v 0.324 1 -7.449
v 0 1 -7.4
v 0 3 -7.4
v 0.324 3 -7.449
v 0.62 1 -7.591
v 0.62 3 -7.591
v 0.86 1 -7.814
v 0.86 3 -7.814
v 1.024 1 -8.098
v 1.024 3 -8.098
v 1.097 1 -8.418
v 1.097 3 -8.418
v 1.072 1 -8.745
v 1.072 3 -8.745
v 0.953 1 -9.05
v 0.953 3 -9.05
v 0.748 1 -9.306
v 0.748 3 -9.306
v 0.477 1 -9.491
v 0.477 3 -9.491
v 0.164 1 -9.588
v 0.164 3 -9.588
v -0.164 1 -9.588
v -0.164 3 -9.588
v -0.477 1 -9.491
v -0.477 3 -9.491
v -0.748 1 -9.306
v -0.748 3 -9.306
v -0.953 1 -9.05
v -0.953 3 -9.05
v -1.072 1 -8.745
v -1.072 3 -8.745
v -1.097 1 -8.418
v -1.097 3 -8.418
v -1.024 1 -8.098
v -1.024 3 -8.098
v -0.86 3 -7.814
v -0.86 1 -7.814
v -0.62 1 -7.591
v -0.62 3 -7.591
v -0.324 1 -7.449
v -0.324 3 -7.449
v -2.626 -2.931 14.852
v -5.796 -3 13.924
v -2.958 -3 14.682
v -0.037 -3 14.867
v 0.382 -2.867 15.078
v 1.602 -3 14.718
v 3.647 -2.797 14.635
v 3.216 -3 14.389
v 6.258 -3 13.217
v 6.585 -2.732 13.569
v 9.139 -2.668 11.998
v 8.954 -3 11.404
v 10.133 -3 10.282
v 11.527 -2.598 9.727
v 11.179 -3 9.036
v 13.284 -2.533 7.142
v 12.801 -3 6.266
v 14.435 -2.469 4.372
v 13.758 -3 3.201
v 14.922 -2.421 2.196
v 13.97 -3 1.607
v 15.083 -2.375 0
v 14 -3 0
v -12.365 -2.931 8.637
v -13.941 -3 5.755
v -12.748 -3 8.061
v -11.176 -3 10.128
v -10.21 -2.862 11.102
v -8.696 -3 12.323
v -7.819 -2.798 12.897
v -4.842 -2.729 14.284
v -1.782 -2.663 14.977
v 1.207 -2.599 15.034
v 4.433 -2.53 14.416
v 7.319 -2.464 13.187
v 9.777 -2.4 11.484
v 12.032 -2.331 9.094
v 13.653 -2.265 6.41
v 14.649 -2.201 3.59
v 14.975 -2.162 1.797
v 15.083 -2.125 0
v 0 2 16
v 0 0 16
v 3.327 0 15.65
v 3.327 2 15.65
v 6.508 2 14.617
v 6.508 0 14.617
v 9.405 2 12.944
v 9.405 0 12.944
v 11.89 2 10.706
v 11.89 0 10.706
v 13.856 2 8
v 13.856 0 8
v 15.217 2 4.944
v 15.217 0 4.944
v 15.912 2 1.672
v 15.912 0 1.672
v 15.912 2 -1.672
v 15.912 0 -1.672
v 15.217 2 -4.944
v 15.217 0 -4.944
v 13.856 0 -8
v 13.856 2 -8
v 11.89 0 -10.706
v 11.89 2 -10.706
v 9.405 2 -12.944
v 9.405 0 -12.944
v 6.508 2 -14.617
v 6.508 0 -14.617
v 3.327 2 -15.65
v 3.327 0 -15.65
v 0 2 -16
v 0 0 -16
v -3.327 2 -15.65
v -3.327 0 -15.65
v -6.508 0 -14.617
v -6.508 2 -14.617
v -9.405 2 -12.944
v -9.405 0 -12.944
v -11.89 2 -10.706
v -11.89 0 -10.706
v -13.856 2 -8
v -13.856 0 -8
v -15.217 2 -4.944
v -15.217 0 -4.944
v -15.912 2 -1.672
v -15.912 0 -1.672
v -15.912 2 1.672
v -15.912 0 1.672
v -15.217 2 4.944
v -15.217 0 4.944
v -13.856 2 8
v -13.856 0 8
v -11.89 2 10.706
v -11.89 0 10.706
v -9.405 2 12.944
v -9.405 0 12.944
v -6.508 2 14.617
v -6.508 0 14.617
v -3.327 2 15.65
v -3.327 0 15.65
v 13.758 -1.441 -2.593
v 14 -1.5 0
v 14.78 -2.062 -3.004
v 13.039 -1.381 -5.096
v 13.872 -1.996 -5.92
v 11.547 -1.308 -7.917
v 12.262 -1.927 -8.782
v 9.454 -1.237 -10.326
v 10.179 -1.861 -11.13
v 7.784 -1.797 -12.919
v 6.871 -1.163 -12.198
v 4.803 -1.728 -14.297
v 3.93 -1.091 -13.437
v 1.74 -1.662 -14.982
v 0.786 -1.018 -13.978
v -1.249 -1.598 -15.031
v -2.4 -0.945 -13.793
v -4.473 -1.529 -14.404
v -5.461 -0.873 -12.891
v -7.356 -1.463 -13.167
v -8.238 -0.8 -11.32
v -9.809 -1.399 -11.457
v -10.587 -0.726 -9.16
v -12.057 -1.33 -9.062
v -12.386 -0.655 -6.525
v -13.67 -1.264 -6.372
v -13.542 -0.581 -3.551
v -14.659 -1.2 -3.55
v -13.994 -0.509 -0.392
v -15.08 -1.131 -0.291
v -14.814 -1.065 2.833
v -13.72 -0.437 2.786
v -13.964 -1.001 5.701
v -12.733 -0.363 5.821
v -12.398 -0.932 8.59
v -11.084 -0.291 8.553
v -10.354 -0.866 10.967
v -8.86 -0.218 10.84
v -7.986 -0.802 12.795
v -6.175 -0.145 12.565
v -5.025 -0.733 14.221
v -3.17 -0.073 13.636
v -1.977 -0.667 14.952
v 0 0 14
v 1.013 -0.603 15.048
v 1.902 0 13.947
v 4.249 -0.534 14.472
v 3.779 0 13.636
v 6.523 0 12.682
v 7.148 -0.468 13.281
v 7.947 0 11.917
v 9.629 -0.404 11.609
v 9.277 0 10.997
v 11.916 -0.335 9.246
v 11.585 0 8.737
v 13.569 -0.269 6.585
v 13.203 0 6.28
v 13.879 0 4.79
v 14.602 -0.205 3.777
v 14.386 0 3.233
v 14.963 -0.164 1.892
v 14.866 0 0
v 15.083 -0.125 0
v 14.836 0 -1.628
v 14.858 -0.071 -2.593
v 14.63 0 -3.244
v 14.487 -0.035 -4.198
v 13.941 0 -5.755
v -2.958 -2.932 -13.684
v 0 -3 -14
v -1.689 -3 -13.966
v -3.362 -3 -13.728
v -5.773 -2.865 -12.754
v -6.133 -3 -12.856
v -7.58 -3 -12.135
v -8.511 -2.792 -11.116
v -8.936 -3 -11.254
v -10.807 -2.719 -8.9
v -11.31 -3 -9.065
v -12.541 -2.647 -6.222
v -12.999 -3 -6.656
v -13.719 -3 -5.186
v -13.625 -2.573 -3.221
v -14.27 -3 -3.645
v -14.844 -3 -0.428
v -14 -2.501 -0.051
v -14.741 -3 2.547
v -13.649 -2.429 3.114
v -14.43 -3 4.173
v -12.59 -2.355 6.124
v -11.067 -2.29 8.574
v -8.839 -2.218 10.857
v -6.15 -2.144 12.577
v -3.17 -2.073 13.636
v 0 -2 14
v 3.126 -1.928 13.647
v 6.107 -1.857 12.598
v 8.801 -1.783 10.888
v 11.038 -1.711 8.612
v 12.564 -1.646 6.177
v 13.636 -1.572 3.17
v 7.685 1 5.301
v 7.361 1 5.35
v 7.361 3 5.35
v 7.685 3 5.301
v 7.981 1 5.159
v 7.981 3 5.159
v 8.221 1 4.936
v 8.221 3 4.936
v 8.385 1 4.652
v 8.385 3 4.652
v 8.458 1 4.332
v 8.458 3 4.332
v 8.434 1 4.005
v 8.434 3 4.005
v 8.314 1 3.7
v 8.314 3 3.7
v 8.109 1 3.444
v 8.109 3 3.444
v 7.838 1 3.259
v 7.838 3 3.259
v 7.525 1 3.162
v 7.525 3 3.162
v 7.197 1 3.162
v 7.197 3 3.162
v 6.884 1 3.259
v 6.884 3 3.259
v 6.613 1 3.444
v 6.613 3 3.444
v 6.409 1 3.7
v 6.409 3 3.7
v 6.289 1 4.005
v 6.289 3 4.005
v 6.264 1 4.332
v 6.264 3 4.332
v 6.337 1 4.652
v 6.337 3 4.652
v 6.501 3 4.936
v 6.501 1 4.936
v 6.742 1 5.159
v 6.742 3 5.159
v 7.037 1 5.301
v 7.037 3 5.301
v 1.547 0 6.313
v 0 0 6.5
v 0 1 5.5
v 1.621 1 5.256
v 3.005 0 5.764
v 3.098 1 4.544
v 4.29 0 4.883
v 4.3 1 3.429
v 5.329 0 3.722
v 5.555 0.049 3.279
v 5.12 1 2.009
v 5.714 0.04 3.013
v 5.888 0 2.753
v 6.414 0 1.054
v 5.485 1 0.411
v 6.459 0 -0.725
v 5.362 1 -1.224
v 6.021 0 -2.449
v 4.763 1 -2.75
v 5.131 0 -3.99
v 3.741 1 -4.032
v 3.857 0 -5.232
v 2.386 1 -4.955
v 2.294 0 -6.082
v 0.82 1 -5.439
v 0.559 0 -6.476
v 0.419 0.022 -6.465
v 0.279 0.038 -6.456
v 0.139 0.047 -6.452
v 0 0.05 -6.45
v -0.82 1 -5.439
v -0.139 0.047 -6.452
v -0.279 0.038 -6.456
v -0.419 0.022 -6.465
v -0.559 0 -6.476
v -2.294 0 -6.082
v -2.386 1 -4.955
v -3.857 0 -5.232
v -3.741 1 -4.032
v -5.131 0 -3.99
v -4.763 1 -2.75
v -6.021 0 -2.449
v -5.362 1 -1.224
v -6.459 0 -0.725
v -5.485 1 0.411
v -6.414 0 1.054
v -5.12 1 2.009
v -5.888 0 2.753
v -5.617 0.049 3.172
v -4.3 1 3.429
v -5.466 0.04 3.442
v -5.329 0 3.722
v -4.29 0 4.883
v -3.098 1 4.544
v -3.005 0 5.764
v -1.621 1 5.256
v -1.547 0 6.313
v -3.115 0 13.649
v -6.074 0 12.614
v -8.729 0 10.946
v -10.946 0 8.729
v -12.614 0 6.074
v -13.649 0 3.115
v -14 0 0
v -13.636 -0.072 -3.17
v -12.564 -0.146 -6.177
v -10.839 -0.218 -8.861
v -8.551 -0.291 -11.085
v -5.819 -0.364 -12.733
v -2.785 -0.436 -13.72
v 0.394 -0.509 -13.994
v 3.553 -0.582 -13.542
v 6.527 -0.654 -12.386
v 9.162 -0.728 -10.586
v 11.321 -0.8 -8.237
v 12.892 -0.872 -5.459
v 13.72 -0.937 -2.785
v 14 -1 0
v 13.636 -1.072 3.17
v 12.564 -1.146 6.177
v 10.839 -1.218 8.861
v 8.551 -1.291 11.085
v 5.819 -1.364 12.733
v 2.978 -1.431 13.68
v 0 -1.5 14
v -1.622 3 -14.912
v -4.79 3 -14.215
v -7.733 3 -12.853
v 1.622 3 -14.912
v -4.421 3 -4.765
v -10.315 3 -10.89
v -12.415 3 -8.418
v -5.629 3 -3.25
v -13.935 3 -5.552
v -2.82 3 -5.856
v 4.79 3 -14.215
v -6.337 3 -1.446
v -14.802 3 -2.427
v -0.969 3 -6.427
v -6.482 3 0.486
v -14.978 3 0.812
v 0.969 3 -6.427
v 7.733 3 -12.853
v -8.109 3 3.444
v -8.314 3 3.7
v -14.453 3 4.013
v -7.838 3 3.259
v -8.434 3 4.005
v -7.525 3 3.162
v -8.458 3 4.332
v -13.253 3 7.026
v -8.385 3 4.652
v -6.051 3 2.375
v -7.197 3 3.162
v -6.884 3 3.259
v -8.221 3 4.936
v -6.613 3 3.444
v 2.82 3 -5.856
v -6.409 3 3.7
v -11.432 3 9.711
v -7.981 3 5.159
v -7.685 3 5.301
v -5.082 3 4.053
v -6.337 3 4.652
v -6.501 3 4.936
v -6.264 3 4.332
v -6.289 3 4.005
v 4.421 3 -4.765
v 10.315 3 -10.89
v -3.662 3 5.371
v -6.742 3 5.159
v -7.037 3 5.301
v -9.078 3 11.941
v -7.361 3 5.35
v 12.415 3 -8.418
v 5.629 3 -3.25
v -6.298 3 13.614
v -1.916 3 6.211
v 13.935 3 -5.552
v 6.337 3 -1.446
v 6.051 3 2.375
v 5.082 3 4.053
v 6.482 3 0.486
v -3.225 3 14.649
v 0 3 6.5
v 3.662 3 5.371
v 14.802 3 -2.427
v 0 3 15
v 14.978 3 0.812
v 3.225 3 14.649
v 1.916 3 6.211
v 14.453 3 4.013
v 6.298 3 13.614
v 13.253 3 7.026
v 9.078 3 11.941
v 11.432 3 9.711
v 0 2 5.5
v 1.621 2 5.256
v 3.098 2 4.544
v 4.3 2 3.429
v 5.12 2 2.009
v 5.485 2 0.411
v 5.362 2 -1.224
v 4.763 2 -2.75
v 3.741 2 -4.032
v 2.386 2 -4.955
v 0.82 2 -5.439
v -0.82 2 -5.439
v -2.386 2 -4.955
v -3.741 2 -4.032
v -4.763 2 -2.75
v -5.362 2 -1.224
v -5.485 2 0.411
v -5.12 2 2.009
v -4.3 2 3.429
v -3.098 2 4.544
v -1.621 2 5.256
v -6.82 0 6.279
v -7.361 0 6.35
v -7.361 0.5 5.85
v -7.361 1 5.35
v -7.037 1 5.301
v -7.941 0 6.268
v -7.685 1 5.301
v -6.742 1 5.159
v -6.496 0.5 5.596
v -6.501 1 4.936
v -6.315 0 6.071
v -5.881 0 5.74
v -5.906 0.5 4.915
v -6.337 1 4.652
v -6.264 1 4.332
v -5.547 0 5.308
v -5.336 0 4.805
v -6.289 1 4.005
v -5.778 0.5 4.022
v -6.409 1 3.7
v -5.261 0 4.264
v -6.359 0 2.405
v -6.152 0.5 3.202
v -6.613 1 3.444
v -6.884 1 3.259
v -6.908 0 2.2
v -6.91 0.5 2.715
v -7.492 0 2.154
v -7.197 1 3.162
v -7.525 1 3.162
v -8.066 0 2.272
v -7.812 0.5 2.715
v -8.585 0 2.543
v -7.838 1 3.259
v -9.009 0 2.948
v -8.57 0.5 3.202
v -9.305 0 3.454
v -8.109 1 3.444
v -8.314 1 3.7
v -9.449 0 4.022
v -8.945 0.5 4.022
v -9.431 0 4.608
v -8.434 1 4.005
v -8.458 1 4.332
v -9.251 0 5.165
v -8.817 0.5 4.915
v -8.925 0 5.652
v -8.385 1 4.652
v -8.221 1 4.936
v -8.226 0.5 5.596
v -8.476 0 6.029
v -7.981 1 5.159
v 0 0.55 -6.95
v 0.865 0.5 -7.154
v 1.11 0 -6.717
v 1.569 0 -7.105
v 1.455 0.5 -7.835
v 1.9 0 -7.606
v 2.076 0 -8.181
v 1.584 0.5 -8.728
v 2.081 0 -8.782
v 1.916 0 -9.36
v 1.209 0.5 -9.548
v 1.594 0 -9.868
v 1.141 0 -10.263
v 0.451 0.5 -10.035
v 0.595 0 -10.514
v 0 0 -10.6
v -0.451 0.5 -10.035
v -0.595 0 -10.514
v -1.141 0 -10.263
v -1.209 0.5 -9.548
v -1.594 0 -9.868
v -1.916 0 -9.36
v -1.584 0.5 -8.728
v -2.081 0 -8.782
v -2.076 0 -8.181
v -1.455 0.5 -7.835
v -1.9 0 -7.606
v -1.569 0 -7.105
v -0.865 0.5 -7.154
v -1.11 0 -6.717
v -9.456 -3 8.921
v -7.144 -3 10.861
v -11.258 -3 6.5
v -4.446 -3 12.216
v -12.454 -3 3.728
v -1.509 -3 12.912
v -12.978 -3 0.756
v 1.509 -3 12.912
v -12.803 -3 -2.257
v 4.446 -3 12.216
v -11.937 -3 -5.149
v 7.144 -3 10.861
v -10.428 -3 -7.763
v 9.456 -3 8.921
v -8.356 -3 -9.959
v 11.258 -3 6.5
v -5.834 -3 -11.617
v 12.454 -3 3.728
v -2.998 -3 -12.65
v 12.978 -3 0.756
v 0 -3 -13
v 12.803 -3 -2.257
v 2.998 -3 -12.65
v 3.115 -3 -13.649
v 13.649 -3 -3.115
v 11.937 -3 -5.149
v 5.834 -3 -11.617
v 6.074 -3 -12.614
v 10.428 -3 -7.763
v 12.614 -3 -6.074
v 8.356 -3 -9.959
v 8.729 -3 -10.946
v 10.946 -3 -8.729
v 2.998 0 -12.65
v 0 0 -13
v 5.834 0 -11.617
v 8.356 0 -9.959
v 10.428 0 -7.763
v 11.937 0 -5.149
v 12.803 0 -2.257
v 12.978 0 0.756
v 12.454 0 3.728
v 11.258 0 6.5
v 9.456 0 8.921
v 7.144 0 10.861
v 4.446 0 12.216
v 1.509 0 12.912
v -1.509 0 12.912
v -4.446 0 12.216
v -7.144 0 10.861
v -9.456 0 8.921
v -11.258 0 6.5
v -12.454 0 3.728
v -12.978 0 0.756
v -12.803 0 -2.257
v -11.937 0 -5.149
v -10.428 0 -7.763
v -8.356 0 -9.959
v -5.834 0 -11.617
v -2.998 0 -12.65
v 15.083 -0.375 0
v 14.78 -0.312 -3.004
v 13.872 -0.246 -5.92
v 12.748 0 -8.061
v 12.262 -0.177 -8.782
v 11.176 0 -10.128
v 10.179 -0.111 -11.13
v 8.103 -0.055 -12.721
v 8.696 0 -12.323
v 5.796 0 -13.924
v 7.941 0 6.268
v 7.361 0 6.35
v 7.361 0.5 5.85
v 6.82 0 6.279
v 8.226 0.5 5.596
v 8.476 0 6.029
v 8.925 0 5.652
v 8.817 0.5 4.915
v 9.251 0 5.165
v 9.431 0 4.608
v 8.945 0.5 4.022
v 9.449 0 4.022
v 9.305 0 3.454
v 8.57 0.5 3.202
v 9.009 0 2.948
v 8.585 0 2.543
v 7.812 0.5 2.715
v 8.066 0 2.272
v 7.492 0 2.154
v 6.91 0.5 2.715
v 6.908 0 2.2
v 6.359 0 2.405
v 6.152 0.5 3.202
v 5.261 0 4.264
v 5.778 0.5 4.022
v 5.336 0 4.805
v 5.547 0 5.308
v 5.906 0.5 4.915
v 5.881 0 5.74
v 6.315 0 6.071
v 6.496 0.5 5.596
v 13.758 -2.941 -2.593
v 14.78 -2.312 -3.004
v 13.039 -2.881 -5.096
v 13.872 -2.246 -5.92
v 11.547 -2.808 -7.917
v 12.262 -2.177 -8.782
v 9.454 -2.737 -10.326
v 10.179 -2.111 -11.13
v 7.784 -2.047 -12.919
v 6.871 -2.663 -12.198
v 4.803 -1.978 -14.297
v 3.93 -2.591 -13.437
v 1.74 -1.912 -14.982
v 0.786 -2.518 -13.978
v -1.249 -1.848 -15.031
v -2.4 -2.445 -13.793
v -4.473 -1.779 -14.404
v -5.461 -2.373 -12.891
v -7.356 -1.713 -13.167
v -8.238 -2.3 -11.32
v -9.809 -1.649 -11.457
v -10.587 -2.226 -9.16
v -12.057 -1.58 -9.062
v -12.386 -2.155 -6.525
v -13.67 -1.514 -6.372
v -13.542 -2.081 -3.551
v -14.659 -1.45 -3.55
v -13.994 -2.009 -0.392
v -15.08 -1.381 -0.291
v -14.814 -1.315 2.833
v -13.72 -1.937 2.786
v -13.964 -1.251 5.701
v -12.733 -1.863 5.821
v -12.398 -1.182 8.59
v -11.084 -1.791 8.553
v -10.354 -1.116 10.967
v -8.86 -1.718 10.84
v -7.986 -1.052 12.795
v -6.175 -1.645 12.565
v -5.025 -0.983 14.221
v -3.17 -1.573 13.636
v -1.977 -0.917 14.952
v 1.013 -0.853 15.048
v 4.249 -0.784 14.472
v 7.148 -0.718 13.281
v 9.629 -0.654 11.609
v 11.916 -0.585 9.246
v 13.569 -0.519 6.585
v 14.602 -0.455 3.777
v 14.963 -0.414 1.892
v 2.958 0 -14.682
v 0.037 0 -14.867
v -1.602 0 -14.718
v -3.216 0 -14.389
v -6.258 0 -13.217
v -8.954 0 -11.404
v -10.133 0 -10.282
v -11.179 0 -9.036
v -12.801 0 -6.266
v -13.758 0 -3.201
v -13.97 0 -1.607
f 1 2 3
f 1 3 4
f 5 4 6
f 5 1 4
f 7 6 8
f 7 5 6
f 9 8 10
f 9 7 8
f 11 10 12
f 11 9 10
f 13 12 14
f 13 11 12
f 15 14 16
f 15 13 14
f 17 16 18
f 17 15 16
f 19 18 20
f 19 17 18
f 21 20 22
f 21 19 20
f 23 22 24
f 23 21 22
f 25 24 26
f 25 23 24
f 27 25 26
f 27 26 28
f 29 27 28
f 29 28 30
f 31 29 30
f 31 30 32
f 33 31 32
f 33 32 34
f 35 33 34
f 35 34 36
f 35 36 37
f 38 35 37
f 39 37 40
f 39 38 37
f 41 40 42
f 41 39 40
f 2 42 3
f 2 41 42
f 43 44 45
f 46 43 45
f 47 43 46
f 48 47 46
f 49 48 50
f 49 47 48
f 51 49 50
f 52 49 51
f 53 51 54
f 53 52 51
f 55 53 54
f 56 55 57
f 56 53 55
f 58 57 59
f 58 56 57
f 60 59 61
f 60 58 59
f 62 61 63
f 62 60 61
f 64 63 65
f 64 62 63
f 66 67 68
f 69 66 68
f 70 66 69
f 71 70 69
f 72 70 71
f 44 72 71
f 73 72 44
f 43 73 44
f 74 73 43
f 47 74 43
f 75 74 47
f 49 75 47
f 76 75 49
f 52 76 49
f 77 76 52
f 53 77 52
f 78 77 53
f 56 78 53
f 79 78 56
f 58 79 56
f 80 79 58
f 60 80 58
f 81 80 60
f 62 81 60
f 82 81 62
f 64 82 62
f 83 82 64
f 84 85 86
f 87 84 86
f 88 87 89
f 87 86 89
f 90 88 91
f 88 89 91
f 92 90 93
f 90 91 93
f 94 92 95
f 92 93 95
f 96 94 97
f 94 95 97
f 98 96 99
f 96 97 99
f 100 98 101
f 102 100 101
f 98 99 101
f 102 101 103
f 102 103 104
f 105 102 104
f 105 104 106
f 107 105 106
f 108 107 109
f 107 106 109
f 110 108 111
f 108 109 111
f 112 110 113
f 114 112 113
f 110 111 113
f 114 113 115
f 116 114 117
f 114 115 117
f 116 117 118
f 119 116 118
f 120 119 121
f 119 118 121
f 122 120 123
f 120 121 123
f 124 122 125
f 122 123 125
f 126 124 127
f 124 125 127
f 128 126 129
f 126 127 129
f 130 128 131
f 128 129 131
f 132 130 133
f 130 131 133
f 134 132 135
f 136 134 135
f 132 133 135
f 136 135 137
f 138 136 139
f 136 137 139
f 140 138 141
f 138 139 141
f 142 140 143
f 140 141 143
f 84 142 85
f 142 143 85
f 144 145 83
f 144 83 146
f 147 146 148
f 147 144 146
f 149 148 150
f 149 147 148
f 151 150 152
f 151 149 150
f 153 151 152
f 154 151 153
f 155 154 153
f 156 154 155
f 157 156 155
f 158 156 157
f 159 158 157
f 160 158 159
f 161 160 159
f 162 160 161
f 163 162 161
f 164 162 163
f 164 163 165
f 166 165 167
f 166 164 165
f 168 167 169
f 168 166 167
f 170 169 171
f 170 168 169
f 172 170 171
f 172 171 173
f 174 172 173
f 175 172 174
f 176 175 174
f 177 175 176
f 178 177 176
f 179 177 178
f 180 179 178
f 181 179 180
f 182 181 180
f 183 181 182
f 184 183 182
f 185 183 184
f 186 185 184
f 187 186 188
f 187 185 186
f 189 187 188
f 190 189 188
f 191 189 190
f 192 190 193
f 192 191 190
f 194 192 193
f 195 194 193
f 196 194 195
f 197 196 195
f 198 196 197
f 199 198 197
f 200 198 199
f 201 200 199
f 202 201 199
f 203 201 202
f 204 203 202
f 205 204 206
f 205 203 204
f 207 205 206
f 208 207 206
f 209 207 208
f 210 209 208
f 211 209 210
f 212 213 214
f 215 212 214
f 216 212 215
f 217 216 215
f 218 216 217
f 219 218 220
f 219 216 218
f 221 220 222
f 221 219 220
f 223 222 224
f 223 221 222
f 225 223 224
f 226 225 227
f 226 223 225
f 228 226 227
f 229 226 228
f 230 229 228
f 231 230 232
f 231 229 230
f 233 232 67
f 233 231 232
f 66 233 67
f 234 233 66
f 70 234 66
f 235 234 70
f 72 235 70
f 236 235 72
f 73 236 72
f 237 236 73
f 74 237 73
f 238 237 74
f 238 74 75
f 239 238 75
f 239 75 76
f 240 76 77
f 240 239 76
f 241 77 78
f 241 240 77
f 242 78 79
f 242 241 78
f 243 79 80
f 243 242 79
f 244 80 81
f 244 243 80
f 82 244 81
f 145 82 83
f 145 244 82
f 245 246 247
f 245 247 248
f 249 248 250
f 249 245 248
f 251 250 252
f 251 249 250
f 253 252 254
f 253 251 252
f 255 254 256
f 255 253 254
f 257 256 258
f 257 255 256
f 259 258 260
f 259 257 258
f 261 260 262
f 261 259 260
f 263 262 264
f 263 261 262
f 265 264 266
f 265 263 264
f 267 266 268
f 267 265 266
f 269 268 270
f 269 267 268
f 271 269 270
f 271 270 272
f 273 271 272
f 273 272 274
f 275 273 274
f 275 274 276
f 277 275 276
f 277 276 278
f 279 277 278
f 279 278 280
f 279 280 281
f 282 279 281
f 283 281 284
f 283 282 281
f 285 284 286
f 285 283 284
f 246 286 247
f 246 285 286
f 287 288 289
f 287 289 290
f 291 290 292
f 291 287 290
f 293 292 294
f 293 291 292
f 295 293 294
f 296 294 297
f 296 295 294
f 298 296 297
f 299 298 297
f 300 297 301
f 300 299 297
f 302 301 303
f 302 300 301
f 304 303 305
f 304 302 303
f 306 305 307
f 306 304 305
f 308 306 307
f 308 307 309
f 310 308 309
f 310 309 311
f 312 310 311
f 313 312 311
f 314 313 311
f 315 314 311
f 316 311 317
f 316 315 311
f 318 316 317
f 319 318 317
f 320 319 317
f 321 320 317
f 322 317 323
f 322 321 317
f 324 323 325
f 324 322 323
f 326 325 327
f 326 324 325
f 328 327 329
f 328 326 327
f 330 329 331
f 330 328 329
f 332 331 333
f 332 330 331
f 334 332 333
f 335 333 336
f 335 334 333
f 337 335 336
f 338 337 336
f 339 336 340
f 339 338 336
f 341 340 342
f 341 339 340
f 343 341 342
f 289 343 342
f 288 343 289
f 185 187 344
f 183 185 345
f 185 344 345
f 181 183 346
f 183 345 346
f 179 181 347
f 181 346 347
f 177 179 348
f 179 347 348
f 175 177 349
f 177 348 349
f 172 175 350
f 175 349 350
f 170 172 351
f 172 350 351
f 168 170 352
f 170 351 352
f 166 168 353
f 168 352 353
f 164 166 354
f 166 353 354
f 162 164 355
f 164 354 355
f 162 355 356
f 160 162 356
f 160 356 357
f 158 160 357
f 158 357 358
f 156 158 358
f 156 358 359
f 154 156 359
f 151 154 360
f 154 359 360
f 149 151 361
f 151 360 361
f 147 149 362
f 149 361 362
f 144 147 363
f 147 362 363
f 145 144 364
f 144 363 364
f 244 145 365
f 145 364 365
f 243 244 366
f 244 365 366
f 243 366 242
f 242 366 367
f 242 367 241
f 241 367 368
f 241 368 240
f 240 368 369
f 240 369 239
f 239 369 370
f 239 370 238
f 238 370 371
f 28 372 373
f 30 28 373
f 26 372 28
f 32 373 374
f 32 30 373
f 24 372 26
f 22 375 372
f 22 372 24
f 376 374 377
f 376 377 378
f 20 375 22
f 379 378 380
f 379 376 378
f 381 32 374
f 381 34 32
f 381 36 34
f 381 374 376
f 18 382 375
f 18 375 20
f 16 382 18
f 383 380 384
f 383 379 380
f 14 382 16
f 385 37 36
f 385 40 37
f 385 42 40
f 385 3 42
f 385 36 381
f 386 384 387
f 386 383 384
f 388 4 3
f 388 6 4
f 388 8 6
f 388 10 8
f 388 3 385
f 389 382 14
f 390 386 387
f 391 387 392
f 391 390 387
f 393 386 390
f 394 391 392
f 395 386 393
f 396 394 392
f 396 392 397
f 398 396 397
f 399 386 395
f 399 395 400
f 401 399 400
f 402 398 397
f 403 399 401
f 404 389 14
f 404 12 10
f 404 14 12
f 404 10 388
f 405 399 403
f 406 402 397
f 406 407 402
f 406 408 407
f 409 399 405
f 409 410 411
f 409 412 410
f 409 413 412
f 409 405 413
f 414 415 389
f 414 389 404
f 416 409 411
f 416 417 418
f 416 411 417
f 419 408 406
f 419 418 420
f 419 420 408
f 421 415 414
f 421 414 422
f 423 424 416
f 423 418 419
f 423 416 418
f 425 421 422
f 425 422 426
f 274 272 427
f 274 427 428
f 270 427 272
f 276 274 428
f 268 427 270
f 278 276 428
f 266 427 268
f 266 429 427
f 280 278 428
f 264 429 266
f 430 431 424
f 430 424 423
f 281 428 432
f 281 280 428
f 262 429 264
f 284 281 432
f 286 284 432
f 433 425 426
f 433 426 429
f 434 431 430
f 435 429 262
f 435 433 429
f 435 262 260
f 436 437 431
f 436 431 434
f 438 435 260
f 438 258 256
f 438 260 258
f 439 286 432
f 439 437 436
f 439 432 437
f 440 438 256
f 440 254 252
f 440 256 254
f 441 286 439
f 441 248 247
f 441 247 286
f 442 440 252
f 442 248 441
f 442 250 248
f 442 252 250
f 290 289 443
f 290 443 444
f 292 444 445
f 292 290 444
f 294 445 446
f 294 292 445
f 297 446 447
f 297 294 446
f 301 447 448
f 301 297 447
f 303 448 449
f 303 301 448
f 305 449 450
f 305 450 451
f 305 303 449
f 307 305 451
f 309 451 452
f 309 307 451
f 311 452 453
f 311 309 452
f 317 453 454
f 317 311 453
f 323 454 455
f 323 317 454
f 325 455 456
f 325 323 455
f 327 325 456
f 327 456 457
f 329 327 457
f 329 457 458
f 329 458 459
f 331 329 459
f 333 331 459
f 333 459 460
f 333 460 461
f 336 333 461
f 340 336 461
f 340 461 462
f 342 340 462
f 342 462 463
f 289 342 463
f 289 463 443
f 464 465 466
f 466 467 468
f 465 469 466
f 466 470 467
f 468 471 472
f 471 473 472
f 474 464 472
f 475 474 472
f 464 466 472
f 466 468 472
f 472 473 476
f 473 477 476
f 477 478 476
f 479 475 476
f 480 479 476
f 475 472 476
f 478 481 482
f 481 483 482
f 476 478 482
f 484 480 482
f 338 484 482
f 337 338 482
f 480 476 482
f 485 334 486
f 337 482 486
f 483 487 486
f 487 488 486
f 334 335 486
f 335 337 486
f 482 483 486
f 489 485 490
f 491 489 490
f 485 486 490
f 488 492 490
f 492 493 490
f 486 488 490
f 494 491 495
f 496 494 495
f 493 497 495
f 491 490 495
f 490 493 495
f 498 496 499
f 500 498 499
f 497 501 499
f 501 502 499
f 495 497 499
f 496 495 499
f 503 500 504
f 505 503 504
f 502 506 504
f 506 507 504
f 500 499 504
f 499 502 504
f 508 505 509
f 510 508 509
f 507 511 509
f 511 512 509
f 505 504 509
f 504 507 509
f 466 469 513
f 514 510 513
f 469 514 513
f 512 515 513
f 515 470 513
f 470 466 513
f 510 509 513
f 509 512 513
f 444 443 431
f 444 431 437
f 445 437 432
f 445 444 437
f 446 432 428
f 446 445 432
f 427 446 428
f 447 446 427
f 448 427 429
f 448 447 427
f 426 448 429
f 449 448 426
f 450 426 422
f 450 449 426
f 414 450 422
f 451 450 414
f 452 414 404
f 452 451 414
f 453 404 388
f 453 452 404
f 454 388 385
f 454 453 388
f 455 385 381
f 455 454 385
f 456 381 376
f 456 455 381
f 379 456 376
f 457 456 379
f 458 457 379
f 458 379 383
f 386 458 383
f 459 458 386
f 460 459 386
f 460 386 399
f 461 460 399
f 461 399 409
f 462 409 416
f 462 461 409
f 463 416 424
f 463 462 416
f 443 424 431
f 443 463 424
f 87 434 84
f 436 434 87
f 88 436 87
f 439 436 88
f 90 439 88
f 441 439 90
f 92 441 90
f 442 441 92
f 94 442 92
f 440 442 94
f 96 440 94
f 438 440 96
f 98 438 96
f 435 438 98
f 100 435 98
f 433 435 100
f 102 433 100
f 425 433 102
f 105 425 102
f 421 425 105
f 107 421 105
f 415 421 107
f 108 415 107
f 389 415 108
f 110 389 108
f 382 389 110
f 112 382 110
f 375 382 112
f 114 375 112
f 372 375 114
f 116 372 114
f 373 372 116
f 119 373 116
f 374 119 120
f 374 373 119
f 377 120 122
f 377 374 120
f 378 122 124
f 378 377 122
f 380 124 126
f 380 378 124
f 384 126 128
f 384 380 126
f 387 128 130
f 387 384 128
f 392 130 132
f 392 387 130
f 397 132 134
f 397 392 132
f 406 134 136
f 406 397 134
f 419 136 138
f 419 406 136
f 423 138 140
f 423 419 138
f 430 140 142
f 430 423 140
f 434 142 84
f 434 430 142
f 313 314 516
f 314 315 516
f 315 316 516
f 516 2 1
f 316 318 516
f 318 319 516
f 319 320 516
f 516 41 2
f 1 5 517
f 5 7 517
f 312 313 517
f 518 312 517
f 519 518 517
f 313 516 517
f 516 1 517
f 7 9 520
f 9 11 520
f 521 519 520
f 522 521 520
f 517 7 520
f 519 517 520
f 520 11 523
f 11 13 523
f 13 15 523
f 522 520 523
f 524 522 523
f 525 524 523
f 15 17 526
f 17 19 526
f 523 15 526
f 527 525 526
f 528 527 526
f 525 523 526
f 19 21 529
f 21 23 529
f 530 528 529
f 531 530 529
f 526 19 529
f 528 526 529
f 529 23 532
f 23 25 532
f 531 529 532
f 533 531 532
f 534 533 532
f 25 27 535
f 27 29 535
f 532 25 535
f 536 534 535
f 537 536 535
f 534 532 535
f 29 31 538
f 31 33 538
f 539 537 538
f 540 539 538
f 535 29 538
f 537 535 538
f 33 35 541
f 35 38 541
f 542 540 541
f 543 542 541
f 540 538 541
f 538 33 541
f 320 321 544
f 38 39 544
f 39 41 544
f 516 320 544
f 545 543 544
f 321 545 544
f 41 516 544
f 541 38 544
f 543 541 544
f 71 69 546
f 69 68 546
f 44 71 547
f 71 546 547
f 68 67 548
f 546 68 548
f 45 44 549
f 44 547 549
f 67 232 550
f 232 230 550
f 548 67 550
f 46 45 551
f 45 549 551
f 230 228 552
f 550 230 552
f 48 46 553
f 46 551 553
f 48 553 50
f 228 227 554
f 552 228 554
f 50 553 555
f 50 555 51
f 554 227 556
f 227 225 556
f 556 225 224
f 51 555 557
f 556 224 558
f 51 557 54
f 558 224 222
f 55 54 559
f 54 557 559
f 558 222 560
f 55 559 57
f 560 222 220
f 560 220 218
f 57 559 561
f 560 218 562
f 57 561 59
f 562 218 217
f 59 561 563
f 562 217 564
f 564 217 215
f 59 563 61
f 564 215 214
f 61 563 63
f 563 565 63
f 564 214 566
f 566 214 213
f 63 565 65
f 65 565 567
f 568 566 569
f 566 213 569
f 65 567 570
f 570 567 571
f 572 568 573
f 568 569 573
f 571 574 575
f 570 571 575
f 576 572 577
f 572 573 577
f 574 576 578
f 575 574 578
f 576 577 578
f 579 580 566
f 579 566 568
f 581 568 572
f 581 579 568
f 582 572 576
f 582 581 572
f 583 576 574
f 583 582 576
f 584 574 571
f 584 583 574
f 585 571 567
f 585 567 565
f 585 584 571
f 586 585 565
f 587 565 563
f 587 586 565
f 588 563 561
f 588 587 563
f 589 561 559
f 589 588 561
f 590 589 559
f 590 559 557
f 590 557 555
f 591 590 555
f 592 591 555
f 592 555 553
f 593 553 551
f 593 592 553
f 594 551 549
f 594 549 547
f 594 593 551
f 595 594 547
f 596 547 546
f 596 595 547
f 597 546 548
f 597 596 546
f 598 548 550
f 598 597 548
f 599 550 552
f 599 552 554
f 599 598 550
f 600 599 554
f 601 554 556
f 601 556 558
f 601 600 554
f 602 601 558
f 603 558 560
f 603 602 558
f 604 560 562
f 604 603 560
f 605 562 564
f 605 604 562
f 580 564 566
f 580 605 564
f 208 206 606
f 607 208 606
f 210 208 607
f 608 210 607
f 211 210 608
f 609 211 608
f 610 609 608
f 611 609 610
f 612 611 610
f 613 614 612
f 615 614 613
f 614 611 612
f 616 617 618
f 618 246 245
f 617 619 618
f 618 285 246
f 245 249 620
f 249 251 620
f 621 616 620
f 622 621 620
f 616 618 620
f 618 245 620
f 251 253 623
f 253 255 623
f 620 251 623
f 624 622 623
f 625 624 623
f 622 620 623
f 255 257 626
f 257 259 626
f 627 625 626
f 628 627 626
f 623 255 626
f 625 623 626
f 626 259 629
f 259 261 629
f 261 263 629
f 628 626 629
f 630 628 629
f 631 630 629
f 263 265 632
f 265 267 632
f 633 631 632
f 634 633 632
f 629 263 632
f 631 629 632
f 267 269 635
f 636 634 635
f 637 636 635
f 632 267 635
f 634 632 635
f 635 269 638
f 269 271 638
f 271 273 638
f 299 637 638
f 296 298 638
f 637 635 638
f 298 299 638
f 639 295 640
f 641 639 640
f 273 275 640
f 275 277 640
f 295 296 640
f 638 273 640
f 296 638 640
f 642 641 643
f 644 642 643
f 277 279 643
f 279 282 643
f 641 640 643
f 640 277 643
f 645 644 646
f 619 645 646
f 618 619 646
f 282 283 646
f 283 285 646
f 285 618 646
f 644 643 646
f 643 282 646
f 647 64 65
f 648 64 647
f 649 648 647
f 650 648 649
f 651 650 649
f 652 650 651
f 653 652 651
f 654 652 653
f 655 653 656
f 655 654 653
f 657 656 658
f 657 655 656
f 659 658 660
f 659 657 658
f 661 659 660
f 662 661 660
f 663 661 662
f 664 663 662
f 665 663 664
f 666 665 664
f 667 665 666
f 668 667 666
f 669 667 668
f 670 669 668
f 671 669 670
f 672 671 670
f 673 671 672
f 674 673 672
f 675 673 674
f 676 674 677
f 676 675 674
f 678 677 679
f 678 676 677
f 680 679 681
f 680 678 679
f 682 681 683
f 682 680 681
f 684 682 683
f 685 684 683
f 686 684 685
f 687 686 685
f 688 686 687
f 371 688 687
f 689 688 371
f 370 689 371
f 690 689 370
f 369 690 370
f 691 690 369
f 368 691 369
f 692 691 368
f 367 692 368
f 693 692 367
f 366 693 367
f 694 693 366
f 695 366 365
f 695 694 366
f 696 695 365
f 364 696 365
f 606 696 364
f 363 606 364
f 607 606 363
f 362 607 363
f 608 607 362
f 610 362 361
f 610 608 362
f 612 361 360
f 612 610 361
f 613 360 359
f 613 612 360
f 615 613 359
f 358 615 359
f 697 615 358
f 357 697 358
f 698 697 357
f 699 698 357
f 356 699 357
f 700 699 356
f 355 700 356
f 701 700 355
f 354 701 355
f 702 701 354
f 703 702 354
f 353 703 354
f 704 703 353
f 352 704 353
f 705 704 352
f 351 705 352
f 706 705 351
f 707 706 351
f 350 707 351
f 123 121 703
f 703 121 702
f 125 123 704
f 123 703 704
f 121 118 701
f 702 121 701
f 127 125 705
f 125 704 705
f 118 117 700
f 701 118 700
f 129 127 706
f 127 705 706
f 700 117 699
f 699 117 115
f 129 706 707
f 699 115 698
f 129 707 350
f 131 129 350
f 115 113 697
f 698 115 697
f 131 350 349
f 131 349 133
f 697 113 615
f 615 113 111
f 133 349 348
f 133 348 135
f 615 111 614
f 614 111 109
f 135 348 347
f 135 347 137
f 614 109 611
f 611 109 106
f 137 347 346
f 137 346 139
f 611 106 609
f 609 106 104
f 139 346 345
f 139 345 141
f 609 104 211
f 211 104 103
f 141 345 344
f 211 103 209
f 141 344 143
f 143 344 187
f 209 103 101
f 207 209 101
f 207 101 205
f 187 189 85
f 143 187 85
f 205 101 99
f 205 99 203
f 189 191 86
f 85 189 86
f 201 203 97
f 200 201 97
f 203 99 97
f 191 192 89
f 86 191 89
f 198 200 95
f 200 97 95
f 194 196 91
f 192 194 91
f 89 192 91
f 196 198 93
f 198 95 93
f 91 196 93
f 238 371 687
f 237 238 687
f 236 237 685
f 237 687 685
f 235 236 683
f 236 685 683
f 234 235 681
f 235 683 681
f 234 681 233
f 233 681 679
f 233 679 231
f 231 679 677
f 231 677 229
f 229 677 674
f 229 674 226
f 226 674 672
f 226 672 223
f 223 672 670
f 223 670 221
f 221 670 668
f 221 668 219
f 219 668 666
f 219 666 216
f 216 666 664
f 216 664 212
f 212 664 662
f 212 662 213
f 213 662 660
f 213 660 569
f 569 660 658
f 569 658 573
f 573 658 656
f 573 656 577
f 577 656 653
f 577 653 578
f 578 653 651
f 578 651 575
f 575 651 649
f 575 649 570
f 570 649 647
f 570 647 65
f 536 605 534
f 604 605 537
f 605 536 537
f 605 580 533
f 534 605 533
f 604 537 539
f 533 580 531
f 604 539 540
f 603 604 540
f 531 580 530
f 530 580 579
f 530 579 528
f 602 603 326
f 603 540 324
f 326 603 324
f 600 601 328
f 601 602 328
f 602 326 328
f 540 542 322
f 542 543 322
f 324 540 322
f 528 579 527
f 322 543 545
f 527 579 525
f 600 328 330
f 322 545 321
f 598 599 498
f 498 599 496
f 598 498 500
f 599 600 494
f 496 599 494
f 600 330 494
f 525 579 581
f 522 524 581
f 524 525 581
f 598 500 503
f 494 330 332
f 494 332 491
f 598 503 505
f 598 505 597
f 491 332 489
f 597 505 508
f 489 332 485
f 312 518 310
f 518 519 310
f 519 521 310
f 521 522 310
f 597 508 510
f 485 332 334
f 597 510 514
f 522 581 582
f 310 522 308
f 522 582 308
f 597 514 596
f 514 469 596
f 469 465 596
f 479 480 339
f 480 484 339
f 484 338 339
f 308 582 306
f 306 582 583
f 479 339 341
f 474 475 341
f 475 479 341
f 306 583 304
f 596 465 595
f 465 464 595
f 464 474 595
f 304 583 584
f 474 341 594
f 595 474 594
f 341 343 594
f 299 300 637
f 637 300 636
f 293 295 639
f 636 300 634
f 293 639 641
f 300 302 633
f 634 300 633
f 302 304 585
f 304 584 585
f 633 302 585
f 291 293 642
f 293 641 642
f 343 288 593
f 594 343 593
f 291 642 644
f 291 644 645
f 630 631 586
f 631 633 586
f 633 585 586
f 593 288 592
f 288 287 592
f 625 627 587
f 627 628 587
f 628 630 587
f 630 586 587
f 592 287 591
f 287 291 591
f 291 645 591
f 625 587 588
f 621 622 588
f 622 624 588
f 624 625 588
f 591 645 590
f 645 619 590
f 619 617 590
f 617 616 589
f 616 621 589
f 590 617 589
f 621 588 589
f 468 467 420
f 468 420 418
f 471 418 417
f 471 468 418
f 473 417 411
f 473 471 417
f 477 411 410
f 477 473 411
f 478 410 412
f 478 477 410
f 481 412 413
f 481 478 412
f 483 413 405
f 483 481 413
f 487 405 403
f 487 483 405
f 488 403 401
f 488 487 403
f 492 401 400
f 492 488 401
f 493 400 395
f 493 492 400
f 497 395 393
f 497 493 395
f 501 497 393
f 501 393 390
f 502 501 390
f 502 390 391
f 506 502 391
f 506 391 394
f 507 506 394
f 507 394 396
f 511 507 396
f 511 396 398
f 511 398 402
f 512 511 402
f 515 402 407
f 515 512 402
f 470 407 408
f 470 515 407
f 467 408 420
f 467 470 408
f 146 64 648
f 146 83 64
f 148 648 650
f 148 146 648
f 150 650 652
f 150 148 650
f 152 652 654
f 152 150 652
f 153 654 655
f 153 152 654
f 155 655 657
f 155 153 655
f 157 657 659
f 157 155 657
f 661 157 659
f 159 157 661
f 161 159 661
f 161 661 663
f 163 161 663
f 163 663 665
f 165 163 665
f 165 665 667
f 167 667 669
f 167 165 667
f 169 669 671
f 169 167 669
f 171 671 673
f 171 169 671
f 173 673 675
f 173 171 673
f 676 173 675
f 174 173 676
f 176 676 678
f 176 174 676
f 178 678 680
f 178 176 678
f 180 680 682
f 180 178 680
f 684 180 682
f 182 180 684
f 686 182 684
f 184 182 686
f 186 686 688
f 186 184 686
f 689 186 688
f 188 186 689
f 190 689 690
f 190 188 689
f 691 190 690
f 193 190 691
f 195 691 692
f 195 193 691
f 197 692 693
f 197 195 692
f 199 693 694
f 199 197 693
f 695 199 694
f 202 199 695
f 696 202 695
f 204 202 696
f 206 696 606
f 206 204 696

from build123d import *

# Parameters (mm, degrees)
SKETCH_1_R      = 16
SKETCH_1_R_2    = 1.1
SKETCH_1_R_3    = 5.5
EXTRUDE_1_DEPTH = 3
SKETCH_2_R      = 14
SKETCH_2_R_2    = 13
EXTRUDE_2_DEPTH = 3
THREAD_1_PITCH  = 2
THREAD_1_FROM   = 2
CHAMFER_1_SIZE  = 1
CHAMFER_2_SIZE  = 1


with BuildPart() as part:
    # Sketch 1 → Бобышка-Вытянуть1 (new body)
    with BuildSketch(Plane(origin=(0, 0, 0), x_dir=(1, 0, 0), z_dir=(0, 1, 0))):
        with Locations(Location((0, 0, 0), (0, 0, 270))):
            Circle(SKETCH_1_R)
        with Locations(Location((0, 8.5, 0), (0, 0, 270))):
            Circle(SKETCH_1_R_2, mode=Mode.SUBTRACT)
        with Locations(Location((7.361215932, -4.25, 0), (0, 0, 270))):
            Circle(SKETCH_1_R_2, mode=Mode.SUBTRACT)
        with Locations(Location((-7.361215932, -4.25, 0), (0, 0, 270))):
            Circle(SKETCH_1_R_2, mode=Mode.SUBTRACT)
        with Locations(Location((0, 0, 0), (0, 0, 270))):
            Circle(SKETCH_1_R_3, mode=Mode.SUBTRACT)
    extrude(amount=EXTRUDE_1_DEPTH)

    # Эскиз2 → Бобышка-Вытянуть2 (add)
    with BuildSketch(Plane.XZ):
        with Locations(Location((0, 0, 0), (0, 0, 90))):
            Circle(SKETCH_2_R)
        with Locations(Location((0, 0, 0), (0, 0, 270))):
            Circle(SKETCH_2_R_2, mode=Mode.SUBTRACT)
    extrude(amount=EXTRUDE_2_DEPTH)

    # Резьба1: arcs per turn and ends read off the stored shape
    # Резьба1: the profile of Sketch 1 2 profile screwed along a right-hand helix through 2.5 turns, 10 arcs to a turn; built about Z, then put on its axis
    thread_1_z = Axis((0, 0, 0), (0, 0, 1))
    thread_1_corners = [(13.9997, 0, -0.000173205), (15.08253175, 0, 0.624999997), (15.08253175, 0, 0.874999997), (13.9997, 0, 1.5001732)]
    with BuildLine(mode=Mode.PRIVATE) as thread_1_profile:
        Line(thread_1_corners[0], thread_1_corners[1])
        Line(thread_1_corners[1], thread_1_corners[2])
        Line(thread_1_corners[2], thread_1_corners[3])
        Line(thread_1_corners[3], thread_1_corners[0])
    thread_1_cap = Face(thread_1_profile.wire())
    thread_1_turn_angles = [0, 18, 36, 54, 72, 90, 108, 126, 144, 162, 180, 198, 216, 234, 252, 270, 288, 306, 324, 342, 360]
    thread_1_turn_weights = [1, 0.9510565162951535, 1, 0.9510565162951535, 1, 0.9510565162951535, 1, 0.9510565162951535, 1, 0.9510565162951535, 1, 0.9510565162951535, 1, 0.9510565162951535, 1, 0.9510565162951535, 1, 0.9510565162951535, 1, 0.9510565162951535, 1]
    thread_1_turn_rails = [Edge.make_bspline([Vector(p[0], p[1], 0).rotate(thread_1_z, thread_1_turn_angles[k]) / thread_1_turn_weights[k] + Vector(0, 0, p[2] + THREAD_1_PITCH * thread_1_turn_angles[k] / 360) for k in range(21)], [0, 0, 0, 1, 1, 2, 2, 3, 3, 4, 4, 5, 5, 6, 6, 7, 7, 8, 8, 9, 9, 10, 10, 10], 2, thread_1_turn_weights) for p in thread_1_corners]
    thread_1_turn_sides = [Face.make_surface_from_curves(thread_1_turn_rails[p[0]], thread_1_turn_rails[p[1]]) for p in [(0, 1), (1, 2), (2, 3), (3, 0)]]
    thread_1_last_angles = [720, 738, 756, 774, 792, 810, 828, 846, 864, 882, 900]
    thread_1_last_weights = [1, 0.9510565162951535, 1, 0.9510565162951535, 1, 0.9510565162951535, 1, 0.9510565162951535, 1, 0.9510565162951535, 1]
    thread_1_last_rails = [Edge.make_bspline([Vector(p[0], p[1], 0).rotate(thread_1_z, thread_1_last_angles[k]) / thread_1_last_weights[k] + Vector(0, 0, p[2] + THREAD_1_PITCH * thread_1_last_angles[k] / 360) for k in range(11)], [0, 0, 0, 1, 1, 2, 2, 3, 3, 4, 4, 5, 5, 5], 2, thread_1_last_weights) for p in thread_1_corners]
    thread_1_last_sides = [Face.make_surface_from_curves(thread_1_last_rails[p[0]], thread_1_last_rails[p[1]]) for p in [(0, 1), (1, 2), (2, 3), (3, 0)]]
    thread_1 = Plane(origin=(0, -5, 0), x_dir=(1, 0, 0), z_dir=(0, 1, 0)) * split(Solid(Shell([*[p.moved(Location((0, 0, THREAD_1_PITCH * i))) for i in range(2) for p in thread_1_turn_sides], *thread_1_last_sides, thread_1_cap, thread_1_cap.rotate(thread_1_z, 900).moved(Location((0, 0, THREAD_1_PITCH * 900 / 360)))])), bisect_by=Plane.XY.offset(THREAD_1_FROM), keep=Keep.TOP, mode=Mode.PRIVATE)
    add(thread_1)

    # Фаска1
    chamfer_1_edges = [part.edges().sort_by_distance(p)[0] for p in [
        (7.361215932, 0, 3.15),
        (-7.361215932, 0, 3.15),
        (0, 3, -16),
        (0, 0, -9.6),
        (0, 3, -5.5),
    ]]
    chamfer(chamfer_1_edges, length=CHAMFER_1_SIZE)

    # Фаска2
    # the kernel refuses this chamfer: 1 mm, written as the material it takes off along each edge
    with BuildSketch(Plane(origin=(0, 0, 0), x_dir=(0, 0, 1), z_dir=(-1, 0, 0))) as chamfer_2_piece_1:
        Polygon((5.5, CHAMFER_2_SIZE), (5.5 + CHAMFER_2_SIZE, 0), (5.5, 0), align=None)
    revolve(axis=Axis((0, 0, 0), (0, 1, 0)), mode=Mode.SUBTRACT)


solid = part.part
